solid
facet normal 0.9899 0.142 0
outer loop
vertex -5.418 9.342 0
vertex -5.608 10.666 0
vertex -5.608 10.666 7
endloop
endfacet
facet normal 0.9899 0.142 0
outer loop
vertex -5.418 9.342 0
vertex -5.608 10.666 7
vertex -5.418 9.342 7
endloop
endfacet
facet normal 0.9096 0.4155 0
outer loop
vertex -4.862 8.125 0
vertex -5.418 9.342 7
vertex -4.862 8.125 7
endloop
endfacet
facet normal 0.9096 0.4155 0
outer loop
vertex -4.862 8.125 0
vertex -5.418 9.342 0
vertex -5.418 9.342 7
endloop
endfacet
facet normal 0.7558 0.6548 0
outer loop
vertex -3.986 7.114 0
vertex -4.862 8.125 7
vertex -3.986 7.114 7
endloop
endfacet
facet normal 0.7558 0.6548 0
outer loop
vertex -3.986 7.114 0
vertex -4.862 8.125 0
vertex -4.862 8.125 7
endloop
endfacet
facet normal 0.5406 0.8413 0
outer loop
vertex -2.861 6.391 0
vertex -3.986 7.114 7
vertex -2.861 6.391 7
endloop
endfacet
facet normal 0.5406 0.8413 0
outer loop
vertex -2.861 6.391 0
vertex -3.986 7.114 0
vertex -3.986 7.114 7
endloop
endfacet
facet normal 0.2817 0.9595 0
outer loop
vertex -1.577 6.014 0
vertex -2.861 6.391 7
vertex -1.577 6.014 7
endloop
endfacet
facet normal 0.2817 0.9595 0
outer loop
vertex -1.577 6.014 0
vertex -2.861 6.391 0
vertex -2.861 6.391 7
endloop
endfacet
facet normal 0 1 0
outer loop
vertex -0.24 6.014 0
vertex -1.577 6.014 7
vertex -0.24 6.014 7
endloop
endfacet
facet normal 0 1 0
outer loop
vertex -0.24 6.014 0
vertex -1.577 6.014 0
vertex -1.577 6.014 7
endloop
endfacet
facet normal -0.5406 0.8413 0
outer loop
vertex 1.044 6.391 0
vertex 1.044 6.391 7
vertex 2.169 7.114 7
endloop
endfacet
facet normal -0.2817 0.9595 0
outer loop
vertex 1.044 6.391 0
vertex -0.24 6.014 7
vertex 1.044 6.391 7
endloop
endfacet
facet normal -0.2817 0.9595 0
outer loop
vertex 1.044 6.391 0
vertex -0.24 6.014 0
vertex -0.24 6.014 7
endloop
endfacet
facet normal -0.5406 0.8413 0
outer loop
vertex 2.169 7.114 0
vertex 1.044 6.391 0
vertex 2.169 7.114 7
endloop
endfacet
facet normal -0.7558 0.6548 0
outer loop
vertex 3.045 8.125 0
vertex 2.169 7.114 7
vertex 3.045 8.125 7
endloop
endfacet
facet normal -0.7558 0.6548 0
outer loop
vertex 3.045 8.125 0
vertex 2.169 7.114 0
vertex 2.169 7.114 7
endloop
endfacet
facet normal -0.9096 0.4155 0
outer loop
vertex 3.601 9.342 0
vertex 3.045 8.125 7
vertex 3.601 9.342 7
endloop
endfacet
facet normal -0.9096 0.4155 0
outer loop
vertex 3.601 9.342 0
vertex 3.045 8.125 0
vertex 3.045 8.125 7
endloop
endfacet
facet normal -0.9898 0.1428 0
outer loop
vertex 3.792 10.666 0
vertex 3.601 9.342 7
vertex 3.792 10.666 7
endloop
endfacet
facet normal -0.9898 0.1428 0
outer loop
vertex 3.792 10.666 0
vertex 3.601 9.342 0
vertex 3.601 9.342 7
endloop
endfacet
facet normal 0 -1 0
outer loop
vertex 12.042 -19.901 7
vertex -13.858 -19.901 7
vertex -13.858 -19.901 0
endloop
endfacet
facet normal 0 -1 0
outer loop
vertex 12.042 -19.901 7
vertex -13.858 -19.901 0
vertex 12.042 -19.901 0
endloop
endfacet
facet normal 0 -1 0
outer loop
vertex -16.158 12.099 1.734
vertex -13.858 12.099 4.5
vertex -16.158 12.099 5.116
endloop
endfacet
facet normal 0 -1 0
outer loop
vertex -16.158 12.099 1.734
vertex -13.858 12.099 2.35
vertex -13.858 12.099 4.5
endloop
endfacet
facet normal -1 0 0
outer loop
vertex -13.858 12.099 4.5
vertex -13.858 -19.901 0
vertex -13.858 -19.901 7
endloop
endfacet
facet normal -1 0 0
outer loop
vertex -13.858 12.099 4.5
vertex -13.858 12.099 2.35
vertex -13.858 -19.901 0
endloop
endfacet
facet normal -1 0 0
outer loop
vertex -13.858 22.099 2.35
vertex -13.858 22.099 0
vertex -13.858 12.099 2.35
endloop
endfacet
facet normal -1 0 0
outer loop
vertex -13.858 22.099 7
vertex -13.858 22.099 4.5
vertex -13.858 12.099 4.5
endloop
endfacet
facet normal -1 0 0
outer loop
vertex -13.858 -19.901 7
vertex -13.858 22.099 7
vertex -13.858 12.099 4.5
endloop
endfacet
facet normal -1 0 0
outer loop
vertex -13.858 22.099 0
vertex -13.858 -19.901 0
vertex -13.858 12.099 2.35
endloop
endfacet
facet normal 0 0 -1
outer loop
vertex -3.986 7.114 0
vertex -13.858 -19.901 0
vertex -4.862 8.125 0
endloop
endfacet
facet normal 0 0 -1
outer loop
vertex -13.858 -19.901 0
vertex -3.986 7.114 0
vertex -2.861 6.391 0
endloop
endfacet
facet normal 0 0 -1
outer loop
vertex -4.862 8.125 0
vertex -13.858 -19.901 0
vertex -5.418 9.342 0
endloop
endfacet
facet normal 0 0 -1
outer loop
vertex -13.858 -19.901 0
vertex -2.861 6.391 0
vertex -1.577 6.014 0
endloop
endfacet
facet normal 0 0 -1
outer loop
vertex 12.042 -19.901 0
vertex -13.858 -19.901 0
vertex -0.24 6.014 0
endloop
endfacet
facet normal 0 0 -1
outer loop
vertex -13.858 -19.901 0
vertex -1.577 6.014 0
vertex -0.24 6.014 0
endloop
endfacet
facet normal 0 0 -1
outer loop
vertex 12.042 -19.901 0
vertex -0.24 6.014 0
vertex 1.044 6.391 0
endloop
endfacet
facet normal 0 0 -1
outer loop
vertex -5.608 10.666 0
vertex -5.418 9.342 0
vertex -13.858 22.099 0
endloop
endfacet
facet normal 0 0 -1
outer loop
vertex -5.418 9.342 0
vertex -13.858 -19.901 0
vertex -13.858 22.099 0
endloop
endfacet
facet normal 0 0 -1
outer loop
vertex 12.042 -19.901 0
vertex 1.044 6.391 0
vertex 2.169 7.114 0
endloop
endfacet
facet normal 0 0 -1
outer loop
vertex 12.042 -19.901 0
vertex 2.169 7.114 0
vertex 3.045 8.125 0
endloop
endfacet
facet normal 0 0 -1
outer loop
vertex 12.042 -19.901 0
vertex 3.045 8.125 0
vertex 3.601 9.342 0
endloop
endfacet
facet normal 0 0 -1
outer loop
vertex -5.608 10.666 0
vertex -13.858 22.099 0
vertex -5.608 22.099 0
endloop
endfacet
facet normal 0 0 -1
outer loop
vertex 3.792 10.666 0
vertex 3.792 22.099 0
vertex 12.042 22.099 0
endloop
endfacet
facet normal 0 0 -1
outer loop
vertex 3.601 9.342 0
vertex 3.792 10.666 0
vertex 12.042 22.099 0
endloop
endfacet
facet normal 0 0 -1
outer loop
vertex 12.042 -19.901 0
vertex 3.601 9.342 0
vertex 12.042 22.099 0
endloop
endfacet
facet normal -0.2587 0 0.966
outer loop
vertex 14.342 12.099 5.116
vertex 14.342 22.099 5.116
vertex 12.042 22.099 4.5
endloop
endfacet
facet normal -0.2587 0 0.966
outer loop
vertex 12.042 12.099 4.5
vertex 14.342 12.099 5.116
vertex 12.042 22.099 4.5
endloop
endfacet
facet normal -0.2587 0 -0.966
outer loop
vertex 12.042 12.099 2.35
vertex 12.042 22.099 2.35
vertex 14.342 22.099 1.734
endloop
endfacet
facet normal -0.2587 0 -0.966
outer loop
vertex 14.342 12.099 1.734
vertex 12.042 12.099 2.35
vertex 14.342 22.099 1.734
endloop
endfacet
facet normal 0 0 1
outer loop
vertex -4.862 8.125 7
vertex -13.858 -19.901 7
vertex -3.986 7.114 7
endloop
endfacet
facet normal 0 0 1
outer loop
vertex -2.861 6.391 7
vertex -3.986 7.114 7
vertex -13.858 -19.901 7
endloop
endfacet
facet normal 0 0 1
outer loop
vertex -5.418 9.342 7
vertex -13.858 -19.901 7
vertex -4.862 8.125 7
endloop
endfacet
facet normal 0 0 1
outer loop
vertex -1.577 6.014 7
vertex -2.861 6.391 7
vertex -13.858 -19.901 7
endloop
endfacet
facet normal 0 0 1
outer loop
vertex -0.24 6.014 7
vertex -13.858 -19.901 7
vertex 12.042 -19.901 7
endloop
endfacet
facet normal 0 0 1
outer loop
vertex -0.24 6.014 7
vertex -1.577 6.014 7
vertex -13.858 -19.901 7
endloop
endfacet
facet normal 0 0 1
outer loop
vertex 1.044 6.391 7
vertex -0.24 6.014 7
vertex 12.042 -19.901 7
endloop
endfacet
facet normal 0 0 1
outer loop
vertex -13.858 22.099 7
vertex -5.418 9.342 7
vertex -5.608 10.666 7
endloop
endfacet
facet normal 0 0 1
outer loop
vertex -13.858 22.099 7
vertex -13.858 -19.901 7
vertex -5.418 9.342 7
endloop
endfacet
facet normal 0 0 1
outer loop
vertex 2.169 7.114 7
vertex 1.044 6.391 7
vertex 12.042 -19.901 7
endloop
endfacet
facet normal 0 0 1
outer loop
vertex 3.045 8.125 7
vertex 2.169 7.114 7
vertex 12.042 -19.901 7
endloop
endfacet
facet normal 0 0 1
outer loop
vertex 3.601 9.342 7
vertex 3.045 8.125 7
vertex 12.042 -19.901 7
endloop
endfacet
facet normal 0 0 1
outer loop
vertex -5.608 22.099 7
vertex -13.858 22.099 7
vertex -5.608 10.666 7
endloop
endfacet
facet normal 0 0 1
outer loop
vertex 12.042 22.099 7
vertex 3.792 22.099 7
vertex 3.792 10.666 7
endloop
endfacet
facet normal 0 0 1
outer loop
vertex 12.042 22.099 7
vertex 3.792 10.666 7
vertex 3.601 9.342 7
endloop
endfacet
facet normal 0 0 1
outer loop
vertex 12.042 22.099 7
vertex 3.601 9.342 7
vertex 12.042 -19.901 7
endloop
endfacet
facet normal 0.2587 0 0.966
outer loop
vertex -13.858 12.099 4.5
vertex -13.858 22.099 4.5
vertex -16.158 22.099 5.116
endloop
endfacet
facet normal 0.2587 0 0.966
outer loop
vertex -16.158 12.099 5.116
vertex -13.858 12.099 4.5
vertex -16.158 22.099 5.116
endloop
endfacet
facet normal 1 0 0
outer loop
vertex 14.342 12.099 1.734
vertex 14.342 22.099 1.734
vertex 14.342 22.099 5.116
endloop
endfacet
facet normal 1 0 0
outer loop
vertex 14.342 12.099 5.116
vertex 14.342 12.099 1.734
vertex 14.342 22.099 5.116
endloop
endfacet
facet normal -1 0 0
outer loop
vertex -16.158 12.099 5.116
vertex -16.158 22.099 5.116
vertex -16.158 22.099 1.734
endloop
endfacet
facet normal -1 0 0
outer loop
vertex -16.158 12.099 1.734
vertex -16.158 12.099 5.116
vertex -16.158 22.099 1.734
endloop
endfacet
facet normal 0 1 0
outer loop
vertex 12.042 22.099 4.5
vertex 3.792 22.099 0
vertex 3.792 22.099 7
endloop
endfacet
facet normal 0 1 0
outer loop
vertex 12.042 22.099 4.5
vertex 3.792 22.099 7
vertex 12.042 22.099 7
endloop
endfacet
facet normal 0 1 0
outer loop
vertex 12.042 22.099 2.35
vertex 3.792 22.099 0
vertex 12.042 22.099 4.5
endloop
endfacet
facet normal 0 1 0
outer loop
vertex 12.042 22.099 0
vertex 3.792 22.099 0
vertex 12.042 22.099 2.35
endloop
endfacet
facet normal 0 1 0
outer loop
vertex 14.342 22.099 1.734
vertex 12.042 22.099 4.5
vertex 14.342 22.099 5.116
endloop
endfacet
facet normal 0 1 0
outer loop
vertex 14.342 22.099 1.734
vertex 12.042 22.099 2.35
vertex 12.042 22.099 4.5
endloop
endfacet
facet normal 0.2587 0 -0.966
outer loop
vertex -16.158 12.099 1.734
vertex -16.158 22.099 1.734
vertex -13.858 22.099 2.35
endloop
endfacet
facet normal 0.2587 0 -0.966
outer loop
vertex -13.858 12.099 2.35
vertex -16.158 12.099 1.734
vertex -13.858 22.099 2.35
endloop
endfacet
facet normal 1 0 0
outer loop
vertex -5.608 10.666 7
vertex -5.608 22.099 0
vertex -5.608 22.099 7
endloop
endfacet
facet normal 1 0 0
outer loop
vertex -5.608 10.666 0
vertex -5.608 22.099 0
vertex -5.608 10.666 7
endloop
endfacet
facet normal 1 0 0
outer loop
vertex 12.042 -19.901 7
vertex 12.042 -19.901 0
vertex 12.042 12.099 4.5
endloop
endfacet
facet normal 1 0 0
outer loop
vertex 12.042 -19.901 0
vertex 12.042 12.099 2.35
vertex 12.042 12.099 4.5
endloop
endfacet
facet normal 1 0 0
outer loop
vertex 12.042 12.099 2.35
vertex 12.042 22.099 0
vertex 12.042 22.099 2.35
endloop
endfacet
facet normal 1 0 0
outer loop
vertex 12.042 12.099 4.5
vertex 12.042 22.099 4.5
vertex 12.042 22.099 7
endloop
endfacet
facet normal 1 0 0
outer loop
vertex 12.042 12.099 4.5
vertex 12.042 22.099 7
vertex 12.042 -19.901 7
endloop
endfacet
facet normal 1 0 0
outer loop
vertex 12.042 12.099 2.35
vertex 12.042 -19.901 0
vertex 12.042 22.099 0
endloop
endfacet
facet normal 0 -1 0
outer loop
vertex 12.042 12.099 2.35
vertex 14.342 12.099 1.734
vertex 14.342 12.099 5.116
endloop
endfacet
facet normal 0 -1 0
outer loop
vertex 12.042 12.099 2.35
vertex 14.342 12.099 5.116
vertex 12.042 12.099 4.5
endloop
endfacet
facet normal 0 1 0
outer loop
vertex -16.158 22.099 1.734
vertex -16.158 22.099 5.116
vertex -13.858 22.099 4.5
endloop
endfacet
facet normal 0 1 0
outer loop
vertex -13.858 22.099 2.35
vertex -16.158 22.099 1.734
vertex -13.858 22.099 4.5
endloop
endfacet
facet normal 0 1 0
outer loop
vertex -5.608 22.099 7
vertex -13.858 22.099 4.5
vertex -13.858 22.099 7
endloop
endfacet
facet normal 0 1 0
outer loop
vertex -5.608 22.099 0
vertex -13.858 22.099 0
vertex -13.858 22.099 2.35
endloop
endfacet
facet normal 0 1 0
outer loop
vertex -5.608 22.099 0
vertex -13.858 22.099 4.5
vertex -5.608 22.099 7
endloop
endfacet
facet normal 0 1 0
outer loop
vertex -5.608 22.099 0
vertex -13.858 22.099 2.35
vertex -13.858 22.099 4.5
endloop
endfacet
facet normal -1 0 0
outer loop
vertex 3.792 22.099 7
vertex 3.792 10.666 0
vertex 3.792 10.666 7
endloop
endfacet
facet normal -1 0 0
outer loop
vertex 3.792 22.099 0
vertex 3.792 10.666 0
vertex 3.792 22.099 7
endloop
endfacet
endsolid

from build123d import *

# Parameters (mm, degrees)
SKETCH1_W           = 25.9
SKETCH1_H           = 30
BOSS_EXTRUDE1_DEPTH = 7
BOSS_EXTRUDE2_DEPTH = 10
CUT_EXTRUDE1_DEPTH  = 10
SKETCH4_W           = 25.9
SKETCH4_H           = 7
BOSS_EXTRUDE3_DEPTH = 12


with BuildPart() as part:
    # Sketch1 → Boss-Extrude1 (new body)
    with BuildSketch(Plane.XY):
        with Locations((-0.908401305, 7.099021207)):
            Rectangle(SKETCH1_W, SKETCH1_H)
    extrude(amount=BOSS_EXTRUDE1_DEPTH)

    # Sketch2 → Boss-Extrude2 (add)
    with BuildSketch(Plane(origin=(0, 22.099021207, 0), x_dir=(1, 0, 0), z_dir=(0, 1, 0))):
        Polygon((-13.858401305, -4.5), (-16.158401305, -5.116283143), (-16.158401305, -1.733716857), (-13.858401305, -2.35), align=None)
        Polygon((12.041598695, -2.35), (14.341598695, -1.733716857), (14.341598695, -5.116283143), (12.041598695, -4.5), align=None)
    extrude(amount=-BOSS_EXTRUDE2_DEPTH)

    # Sketch3 → Cut-Extrude1 (cut)
    with BuildSketch(Plane(origin=(0, 0, 0), x_dir=(-1, 0, 0), z_dir=(0, 0, -1))):
        with BuildLine():
            Line((-3.791598695, 10.666053203), (-3.791598695, 22.099021207))
            Line((-3.791598695, 22.099021207), (5.608401305, 22.099021207))
            Line((5.608401305, 22.099021207), (5.608401305, 10.666053203))
            ThreePointArc((5.608401305, 10.666053203), (0.908401305, 5.966053203), (-3.791598695, 10.666053203))
        make_face()
    extrude(amount=-CUT_EXTRUDE1_DEPTH, mode=Mode.SUBTRACT)

    # Sketch4 → Boss-Extrude3 (add)
    with BuildSketch(Plane.XZ.offset(7.900978793)):
        with Locations((-0.908401305, 3.5)):
            Rectangle(SKETCH4_W, SKETCH4_H)
    extrude(amount=BOSS_EXTRUDE3_DEPTH)


solid = part.part
